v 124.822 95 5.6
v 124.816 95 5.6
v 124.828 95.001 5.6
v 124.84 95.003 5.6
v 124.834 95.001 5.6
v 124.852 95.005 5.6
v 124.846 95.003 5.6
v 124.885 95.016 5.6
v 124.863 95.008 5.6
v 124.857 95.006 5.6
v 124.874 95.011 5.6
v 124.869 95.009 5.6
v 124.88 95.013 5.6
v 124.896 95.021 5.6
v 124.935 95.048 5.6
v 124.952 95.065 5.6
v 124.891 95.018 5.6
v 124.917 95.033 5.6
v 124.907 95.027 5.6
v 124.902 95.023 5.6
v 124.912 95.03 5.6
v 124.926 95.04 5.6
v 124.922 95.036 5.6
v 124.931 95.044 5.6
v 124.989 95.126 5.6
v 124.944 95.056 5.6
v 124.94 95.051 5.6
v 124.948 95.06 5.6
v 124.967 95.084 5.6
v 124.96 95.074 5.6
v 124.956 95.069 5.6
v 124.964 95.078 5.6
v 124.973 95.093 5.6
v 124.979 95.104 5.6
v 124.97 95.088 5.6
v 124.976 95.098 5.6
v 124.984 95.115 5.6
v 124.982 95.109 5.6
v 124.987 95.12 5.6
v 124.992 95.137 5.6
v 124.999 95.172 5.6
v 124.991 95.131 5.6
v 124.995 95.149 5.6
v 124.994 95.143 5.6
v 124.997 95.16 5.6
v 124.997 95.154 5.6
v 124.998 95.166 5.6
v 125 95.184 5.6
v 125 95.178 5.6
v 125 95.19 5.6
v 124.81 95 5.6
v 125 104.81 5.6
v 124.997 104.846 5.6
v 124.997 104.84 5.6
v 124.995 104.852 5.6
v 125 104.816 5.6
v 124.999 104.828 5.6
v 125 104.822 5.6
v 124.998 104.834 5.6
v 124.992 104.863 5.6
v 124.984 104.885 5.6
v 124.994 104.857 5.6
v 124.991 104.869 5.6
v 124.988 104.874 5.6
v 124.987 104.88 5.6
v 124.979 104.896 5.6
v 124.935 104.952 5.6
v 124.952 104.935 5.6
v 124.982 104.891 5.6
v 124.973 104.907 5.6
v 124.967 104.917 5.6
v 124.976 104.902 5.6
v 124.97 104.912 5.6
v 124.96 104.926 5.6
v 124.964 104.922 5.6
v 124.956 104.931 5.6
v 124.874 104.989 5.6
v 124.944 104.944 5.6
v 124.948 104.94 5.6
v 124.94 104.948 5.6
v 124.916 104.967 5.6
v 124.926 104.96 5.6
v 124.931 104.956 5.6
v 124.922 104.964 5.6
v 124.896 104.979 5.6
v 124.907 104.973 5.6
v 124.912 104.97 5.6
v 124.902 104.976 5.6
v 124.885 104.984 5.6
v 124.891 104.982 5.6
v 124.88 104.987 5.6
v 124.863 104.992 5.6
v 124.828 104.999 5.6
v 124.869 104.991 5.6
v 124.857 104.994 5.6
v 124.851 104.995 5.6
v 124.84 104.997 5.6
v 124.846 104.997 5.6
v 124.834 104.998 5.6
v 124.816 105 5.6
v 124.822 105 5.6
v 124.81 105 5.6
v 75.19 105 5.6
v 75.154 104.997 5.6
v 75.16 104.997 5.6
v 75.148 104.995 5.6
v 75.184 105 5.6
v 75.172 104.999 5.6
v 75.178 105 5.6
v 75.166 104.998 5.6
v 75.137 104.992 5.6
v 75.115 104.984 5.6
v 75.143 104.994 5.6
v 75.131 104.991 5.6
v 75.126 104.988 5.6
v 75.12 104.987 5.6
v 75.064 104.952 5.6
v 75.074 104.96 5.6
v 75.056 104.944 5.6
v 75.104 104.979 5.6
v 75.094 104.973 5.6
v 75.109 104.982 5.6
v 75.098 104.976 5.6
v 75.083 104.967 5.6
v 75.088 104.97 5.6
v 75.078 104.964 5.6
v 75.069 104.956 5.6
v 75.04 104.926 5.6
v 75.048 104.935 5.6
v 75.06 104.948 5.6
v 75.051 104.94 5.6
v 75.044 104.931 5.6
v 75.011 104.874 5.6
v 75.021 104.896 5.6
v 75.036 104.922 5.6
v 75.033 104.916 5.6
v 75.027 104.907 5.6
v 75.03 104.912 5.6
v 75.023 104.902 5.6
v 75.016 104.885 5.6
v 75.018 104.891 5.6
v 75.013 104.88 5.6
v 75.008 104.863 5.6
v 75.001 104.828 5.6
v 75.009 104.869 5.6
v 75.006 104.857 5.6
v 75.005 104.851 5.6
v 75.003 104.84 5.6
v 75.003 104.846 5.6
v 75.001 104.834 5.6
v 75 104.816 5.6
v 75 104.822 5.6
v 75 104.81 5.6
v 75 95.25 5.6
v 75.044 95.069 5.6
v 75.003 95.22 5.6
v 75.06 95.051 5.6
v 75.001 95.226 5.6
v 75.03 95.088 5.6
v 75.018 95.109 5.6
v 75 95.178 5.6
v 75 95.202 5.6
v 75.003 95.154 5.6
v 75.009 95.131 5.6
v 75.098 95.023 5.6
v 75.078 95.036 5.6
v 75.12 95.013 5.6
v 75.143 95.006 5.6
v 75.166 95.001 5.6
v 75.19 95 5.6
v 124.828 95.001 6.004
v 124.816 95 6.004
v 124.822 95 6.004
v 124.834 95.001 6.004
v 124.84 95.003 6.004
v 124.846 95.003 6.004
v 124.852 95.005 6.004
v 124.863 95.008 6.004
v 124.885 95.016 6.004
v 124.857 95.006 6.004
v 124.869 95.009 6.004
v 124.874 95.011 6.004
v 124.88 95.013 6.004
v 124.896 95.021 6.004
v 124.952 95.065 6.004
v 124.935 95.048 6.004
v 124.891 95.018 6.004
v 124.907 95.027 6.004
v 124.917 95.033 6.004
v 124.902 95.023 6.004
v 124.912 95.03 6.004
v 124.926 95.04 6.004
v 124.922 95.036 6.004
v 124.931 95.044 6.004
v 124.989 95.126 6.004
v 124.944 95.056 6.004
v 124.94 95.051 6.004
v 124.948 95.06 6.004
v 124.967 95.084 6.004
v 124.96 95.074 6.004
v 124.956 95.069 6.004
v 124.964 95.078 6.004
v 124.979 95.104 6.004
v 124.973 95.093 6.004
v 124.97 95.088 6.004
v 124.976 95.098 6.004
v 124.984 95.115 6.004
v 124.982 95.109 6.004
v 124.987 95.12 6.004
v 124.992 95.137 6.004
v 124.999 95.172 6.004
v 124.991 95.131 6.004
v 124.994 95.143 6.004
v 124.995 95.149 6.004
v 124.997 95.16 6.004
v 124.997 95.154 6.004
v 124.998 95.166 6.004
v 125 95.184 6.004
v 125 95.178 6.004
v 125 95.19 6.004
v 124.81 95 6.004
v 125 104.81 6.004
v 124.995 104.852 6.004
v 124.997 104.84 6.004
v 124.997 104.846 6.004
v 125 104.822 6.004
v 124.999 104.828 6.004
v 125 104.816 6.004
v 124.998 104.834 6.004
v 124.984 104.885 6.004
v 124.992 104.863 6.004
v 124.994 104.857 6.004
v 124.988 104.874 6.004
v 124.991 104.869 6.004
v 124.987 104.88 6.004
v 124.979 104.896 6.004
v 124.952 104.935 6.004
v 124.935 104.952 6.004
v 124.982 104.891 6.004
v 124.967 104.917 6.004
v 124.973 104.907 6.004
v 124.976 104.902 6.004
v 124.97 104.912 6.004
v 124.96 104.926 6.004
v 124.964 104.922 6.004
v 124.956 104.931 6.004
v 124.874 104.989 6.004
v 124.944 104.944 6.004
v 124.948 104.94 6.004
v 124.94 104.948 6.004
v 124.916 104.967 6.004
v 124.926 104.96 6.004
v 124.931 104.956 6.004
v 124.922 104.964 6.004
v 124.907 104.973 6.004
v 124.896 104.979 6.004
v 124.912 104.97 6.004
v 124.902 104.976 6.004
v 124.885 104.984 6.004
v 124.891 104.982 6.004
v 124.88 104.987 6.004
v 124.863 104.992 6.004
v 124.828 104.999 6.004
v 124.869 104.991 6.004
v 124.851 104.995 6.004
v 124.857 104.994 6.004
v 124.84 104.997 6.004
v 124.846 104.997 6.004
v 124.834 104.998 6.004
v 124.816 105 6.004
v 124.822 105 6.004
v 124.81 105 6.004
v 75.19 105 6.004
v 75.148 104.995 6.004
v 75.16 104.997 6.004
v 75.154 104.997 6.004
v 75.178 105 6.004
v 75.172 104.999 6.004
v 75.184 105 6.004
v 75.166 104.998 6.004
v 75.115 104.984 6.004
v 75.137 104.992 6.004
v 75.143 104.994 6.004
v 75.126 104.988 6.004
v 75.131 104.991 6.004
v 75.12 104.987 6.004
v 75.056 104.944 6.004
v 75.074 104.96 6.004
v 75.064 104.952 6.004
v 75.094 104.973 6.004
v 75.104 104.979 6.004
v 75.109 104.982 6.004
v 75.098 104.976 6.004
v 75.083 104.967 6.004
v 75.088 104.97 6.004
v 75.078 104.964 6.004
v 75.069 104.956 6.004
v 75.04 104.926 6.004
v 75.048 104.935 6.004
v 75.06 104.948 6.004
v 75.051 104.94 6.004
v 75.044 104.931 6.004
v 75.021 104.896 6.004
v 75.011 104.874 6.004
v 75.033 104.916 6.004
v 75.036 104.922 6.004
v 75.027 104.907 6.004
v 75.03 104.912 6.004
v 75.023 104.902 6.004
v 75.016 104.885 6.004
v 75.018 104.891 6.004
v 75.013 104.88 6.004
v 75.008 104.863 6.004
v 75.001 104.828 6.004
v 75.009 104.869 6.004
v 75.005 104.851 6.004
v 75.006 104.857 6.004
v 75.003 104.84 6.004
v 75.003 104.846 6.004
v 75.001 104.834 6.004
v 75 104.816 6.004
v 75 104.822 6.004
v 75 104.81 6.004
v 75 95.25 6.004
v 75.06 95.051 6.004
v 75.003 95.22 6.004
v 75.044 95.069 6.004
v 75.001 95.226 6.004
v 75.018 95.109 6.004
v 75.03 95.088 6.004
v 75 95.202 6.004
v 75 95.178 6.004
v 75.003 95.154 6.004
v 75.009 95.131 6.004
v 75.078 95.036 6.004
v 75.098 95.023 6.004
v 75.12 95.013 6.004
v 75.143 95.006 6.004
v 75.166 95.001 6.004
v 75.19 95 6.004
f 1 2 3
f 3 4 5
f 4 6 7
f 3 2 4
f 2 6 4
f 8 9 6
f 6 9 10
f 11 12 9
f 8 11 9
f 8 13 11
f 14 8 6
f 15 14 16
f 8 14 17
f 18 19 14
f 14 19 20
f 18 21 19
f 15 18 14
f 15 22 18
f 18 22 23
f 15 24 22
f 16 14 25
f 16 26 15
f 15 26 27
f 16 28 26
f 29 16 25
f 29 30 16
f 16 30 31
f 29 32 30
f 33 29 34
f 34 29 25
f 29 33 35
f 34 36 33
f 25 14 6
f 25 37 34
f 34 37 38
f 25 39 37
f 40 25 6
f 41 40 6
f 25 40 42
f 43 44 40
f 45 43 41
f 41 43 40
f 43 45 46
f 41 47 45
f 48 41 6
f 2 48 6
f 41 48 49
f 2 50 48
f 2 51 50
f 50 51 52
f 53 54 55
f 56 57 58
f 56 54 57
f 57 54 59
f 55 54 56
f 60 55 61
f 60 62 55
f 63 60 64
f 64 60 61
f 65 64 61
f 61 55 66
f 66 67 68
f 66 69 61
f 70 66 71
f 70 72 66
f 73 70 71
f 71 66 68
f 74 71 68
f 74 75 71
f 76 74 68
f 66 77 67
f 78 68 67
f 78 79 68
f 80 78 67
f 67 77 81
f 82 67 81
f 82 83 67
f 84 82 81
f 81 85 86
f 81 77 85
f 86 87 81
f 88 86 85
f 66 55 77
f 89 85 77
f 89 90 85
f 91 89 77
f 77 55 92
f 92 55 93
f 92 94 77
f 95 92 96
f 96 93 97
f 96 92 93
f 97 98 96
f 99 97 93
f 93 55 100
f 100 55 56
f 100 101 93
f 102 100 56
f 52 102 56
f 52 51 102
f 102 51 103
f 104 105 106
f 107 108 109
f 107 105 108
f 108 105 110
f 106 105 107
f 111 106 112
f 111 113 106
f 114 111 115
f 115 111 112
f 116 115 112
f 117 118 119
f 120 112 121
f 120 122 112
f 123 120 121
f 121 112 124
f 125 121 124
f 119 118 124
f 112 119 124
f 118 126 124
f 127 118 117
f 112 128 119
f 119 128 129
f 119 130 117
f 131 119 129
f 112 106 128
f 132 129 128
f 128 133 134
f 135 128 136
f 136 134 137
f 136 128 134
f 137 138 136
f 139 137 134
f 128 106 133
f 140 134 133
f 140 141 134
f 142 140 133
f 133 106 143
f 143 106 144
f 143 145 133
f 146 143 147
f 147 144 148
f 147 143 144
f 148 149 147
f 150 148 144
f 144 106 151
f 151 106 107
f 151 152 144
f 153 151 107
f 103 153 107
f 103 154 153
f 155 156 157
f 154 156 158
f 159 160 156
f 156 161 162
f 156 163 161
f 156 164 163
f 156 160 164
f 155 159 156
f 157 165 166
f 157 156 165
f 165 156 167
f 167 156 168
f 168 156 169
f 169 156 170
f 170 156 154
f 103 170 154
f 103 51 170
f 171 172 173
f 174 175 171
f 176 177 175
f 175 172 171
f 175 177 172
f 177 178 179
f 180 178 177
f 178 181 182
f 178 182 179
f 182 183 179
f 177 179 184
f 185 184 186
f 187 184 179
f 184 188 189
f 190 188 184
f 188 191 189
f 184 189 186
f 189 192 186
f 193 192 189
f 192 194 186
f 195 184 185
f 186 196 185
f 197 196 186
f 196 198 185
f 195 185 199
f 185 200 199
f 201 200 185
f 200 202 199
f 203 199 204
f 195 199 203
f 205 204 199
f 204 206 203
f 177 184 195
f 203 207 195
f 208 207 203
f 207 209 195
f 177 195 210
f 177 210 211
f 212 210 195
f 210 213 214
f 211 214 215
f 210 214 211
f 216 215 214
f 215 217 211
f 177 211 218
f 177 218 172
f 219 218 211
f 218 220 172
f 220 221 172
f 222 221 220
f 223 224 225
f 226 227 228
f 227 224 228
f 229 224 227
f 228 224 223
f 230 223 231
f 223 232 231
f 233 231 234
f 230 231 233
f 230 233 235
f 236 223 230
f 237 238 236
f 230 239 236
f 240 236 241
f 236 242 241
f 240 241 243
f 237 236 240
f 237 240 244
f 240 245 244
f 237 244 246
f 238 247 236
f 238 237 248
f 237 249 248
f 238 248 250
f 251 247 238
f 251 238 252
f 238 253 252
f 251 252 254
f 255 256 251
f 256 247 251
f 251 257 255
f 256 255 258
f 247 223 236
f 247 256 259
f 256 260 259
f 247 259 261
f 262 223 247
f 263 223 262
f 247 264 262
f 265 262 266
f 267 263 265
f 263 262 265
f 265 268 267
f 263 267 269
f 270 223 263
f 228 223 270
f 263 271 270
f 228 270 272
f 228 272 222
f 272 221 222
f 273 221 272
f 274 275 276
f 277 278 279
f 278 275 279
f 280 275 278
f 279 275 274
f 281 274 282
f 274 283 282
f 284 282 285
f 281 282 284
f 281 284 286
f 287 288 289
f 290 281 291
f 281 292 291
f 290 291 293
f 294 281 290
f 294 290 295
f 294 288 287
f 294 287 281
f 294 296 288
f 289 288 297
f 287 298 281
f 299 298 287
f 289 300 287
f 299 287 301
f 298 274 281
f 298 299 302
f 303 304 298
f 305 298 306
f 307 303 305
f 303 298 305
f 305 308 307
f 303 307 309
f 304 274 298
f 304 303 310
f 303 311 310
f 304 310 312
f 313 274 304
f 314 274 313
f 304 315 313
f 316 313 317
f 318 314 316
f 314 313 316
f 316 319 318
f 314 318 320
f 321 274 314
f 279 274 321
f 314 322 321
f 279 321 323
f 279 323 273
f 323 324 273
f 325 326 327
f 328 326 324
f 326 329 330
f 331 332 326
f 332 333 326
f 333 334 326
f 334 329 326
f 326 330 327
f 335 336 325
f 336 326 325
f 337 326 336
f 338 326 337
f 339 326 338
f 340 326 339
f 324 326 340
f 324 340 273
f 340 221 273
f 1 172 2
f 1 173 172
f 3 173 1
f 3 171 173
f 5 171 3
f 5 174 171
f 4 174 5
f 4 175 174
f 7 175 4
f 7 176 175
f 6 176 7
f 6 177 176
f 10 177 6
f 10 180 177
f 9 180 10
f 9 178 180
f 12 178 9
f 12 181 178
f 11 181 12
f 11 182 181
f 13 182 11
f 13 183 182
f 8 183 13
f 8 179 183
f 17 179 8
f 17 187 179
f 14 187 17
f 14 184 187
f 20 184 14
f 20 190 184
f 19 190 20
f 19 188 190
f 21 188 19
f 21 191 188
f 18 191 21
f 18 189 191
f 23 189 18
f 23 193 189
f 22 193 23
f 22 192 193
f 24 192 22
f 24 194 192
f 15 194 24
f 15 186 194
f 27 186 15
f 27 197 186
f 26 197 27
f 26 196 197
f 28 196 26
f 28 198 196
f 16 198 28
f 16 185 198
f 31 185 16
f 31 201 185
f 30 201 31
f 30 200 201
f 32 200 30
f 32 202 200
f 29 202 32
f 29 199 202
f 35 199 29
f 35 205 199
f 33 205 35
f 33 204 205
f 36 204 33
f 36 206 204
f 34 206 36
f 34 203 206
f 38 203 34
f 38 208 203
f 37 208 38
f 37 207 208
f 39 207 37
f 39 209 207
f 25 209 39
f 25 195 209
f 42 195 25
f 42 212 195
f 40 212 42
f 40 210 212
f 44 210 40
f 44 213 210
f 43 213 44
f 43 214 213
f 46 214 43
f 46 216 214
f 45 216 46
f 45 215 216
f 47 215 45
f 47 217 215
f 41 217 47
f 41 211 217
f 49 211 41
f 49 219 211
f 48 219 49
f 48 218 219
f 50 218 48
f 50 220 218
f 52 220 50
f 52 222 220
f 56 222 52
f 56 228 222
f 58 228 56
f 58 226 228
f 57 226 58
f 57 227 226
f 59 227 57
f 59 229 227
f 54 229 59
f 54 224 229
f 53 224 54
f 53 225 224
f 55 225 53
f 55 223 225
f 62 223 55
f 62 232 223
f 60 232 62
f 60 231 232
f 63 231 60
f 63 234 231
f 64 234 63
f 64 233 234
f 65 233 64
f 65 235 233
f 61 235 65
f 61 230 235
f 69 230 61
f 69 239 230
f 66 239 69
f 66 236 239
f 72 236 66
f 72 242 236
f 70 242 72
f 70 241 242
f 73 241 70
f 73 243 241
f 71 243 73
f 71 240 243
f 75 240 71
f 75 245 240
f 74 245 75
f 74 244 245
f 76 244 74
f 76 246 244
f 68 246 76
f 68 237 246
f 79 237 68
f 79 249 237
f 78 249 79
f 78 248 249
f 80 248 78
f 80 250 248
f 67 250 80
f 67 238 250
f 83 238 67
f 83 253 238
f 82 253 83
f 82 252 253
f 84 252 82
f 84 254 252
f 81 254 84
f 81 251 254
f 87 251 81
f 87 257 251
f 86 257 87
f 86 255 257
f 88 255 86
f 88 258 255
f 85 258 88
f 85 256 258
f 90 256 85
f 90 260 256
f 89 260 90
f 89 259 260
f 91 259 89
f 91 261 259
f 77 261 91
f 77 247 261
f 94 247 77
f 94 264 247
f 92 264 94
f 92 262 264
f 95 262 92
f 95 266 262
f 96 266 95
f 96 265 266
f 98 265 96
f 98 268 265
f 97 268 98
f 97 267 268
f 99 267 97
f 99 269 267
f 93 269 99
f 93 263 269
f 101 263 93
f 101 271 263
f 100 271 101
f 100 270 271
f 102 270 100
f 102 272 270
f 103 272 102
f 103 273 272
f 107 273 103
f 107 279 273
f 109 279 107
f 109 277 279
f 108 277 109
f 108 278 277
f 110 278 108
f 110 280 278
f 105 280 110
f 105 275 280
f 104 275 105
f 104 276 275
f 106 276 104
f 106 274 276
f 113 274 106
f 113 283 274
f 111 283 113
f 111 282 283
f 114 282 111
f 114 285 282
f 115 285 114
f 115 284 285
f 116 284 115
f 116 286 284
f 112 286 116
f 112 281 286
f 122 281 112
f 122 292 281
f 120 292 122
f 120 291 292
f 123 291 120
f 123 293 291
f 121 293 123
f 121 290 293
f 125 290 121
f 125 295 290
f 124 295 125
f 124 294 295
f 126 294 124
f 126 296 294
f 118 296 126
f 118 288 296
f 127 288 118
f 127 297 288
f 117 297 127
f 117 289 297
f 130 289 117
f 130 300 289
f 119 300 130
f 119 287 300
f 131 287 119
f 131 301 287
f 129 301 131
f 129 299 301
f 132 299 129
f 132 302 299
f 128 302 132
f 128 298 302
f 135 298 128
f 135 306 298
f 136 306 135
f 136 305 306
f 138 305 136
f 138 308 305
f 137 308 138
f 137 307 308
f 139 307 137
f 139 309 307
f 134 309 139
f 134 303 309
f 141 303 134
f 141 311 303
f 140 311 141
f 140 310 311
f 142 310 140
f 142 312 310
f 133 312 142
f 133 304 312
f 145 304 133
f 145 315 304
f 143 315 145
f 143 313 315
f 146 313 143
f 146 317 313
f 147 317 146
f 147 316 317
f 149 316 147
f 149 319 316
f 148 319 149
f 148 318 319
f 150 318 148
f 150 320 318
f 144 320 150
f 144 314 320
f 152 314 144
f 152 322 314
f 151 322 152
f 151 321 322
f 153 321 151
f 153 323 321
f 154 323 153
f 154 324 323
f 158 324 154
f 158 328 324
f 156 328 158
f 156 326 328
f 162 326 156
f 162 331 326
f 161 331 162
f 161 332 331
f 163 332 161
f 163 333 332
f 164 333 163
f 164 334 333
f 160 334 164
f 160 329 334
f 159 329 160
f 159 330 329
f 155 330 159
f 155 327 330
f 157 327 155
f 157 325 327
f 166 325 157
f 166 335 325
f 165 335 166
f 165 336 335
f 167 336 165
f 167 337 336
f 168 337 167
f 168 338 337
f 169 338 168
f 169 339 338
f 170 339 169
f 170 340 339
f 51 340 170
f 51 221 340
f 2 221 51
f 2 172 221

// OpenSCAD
module drawBasicShape(x1, y1, x2, y2, width)
{
	length = sqrt((x1-x2)*(x1-x2) + (y1-y2)*(y1-y2));
	if (width!=0.0) {
		square(size = [width, length], center = false);
		translate([width/2.0, 0, 0]) circle(d=width);
		translate([width/2.0, length, 0]) circle(d=width);
	}
}

module translateAndRotate(x1, y1, x2, y2, width)
{
	if (width != 0.0) {
		angle = atan((y2-y1)/(x2-x1)) +270;
		if (x2>=x1) {
			translate([x1, y1, 0.0]) rotate([0.0, 0.0, angle]) translate([-width/2.0, 0.0, 0.0]) scale([1.0, 1.0, 1.0]) drawBasicShape(x1, y1, x2, y2, width);
		}
		else {
			translate([x1, y1, 0.0]) rotate([0.0, 0.0, angle+180]) translate([-width/2.0, 0.0, 0.0]) scale([1.0, 1.0, 1.0]) drawBasicShape(x1, y1, x2, y2, width);		}
	}
}

$fn=50;

points13 = [
[75.77800000, 95.77800000, 0.00000000],
[124.22200000, 95.77800000, 0.37999672],
[124.22200000, 104.22200000, 0.37997788],
[75.77800000, 104.22200000, 0.37999548],
[75.77800000, 95.83800000, 0.37998140],
[75.48400000, 95.48400000, 0.00000000],
[124.51600000, 95.48400000, 0.37999746],
[124.51600000, 104.51600000, 0.37998977],
[75.48400000, 104.51600000, 0.37999868],
[75.48400000, 95.54400000, 0.37998644],
[75.19000000, 95.19000000, 0.00000000],
[124.81000000, 95.19000000, 0.38000060],
[124.81000000, 104.81000000, 0.38000021],
[75.19000000, 104.81000000, 0.37999939],
[75.19000000, 95.25000000, 0.38000344],
[75.53600000, 95.39000000, 0.00000000],
[76.11100000, 95.94600000, 0.00000000],
[75.94600000, 96.11100000, 0.37935605],
[75.94600000, 96.52800000, 0.38015610],
[76.52800000, 95.94600000, 0.37989934],
[76.94500000, 95.94600000, 0.38001190],
[75.94600000, 96.94500000, 0.37994651],
[75.94600000, 97.36200000, 0.38015610],
[77.36200000, 95.94600000, 0.37996589],
[77.77900000, 95.94600000, 0.38015610],
[75.94600000, 97.77900000, 0.37999966],
[75.94600000, 98.19600000, 0.38001190],
[78.19600000, 95.94600000, 0.38000201],
[78.61300000, 95.94600000, 0.38015610],
[75.94600000, 98.61300000, 0.38000362],
[75.94600000, 99.03000000, 0.38001190],
[79.03000000, 95.94600000, 0.38003238],
[79.44700000, 95.94600000, 0.38001190],
[75.94600000, 99.44700000, 0.38001785],
[75.94600000, 99.86400000, 0.38001190],
[79.86400000, 95.94600000, 0.38002811],
[80.28100000, 95.94600000, 0.38001190],
[75.94600000, 100.28100000, 0.38002660],
[75.94600000, 100.69800000, 0.38015610],
[80.69800000, 95.94600000, 0.38002534],
[81.11500000, 95.94600000, 0.38001190],
[75.94600000, 101.11500000, 0.38003252],
[75.94600000, 101.53300000, 0.37930814],
[81.53300000, 95.94600000, 0.37997836],
[81.95000000, 95.94600000, 0.38001190],
[75.94600000, 101.95000000, 0.37998780],
[75.94600000, 102.36700000, 0.38001190],
[82.36700000, 95.94600000, 0.37998939],
[82.78400000, 95.94600000, 0.38001190],
[75.94600000, 102.78400000, 0.37999079],
[75.94600000, 103.20100000, 0.38001190],
[83.20100000, 95.94600000, 0.37999203],
[83.61800000, 95.94600000, 0.38015610],
[75.94600000, 103.61800000, 0.37999314],
[75.95600000, 104.02400000, 0.38048727],
[84.03500000, 95.94600000, 0.38000275],
[84.45200000, 95.94600000, 0.38001190],
[76.34400000, 104.05400000, 0.38000754],
[76.76100000, 104.05400000, 0.38001190],
[84.86900000, 95.94600000, 0.38000229],
[85.28600000, 95.94600000, 0.38001190],
[77.17800000, 104.05400000, 0.38000754],
[77.59500000, 104.05400000, 0.38001190],
[85.70300000, 95.94600000, 0.38000229],
[86.12000000, 95.94600000, 0.38015610],
[78.01200000, 104.05400000, 0.38000229],
[78.42900000, 104.05400000, 0.38001190],
[86.53700000, 95.94600000, 0.38000754],
[86.95400000, 95.94600000, 0.38001190],
[78.84600000, 104.05400000, 0.38000229],
[79.26300000, 104.05400000, 0.38001190],
[87.37100000, 95.94600000, 0.38000754],
[87.78900000, 95.94600000, 0.37930814],
[79.68000000, 104.05400000, 0.37998415],
[80.09700000, 104.05400000, 0.38015610],
[88.20600000, 95.94600000, 0.37998415],
[88.62300000, 95.94600000, 0.38001190],
[80.51500000, 104.05400000, 0.38000754],
[80.93200000, 104.05400000, 0.38001190],
[89.04000000, 95.94600000, 0.38000229],
[89.45700000, 95.94600000, 0.38001190],
[81.34900000, 104.05400000, 0.38000754],
[81.76600000, 104.05400000, 0.38001190],
[89.87400000, 95.94600000, 0.38000229],
[90.29100000, 95.94600000, 0.38015610],
[82.18300000, 104.05400000, 0.38000229],
[82.60000000, 104.05400000, 0.38001190],
[90.70800000, 95.94600000, 0.38000229],
[91.12500000, 95.94600000, 0.38015610],
[83.01700000, 104.05400000, 0.38000229],
[83.43400000, 104.05400000, 0.38001190],
[91.54200000, 95.94600000, 0.38000754],
[91.95900000, 95.94600000, 0.38001190],
[83.85100000, 104.05400000, 0.38000229],
[84.26800000, 104.05400000, 0.38001190],
[92.37600000, 95.94600000, 0.38000754],
[92.79300000, 95.94600000, 0.38001190],
[84.68500000, 104.05400000, 0.38000229],
[85.10200000, 104.05400000, 0.38015610],
[93.21000000, 95.94600000, 0.38000229],
[93.62700000, 95.94600000, 0.38001190],
[85.51900000, 104.05400000, 0.38000754],
[85.93600000, 104.05400000, 0.38001190],
[94.04400000, 95.94600000, 0.38000229],
[94.46200000, 95.94600000, 0.37930814],
[86.35300000, 104.05400000, 0.37998940],
[86.77000000, 104.05400000, 0.38001190],
[94.87900000, 95.94600000, 0.37998415],
[95.29600000, 95.94600000, 0.38015610],
[87.18800000, 104.05400000, 0.38000229],
[87.60500000, 104.05400000, 0.38001190],
[95.71300000, 95.94600000, 0.38000754],
[96.13000000, 95.94600000, 0.38001190],
[88.02200000, 104.05400000, 0.38000229],
[88.43900000, 104.05400000, 0.38001190],
[96.54700000, 95.94600000, 0.38000754],
[96.96400000, 95.94600000, 0.38001190],
[88.85600000, 104.05400000, 0.38000229],
[89.27300000, 104.05400000, 0.38015610],
[97.38100000, 95.94600000, 0.38000229],
[97.79800000, 95.94600000, 0.38001190],
[89.69000000, 104.05400000, 0.38000754],
[90.10700000, 104.05400000, 0.38001190],
[98.21500000, 95.94600000, 0.38000229],
[98.63200000, 95.94600000, 0.38001190],
[90.52400000, 104.05400000, 0.38000754],
[90.94100000, 104.05400000, 0.38001190],
[99.04900000, 95.94600000, 0.38000229],
[99.46600000, 95.94600000, 0.38015610],
[91.35800000, 104.05400000, 0.38000229],
[91.77500000, 104.05400000, 0.38001190],
[99.88300000, 95.94600000, 0.38000754],
[100.30000000, 95.94600000, 0.38001190],
[92.19200000, 104.05400000, 0.38000229],
[92.60900000, 104.05400000, 0.38001190],
[100.71800000, 95.94600000, 0.37998940],
[101.13500000, 95.94600000, 0.38001190],
[93.02600000, 104.05400000, 0.37998415],
[93.44400000, 104.05400000, 0.37945200],
[101.55200000, 95.94600000, 0.38000229],
[101.96900000, 95.94600000, 0.38001190],
[93.86100000, 104.05400000, 0.38000754],
[94.27800000, 104.05400000, 0.38001190],
[102.38600000, 95.94600000, 0.38000229],
[102.80300000, 95.94600000, 0.38001190],
[94.69500000, 104.05400000, 0.38000754],
[95.11200000, 104.05400000, 0.38001190],
[103.22000000, 95.94600000, 0.38000229],
[103.63700000, 95.94600000, 0.38015610],
[95.52900000, 104.05400000, 0.38000229],
[95.94600000, 104.05400000, 0.38001190],
[104.05400000, 95.94600000, 0.38000754],
[104.47100000, 95.94600000, 0.38001190],
[96.36300000, 104.05400000, 0.38000229],
[96.78000000, 104.05400000, 0.38001190],
[104.88800000, 95.94600000, 0.38000754],
[105.30500000, 95.94600000, 0.38001190],
[97.19700000, 104.05400000, 0.38000229],
[97.61400000, 104.05400000, 0.38015610],
[105.72200000, 95.94600000, 0.38000229],
[106.13900000, 95.94600000, 0.38001190],
[98.03100000, 104.05400000, 0.38000754],
[98.44800000, 104.05400000, 0.38001190],
[106.55600000, 95.94600000, 0.38000229],
[106.97300000, 95.94600000, 0.38001190],
[98.86500000, 104.05400000, 0.38000754],
[99.28200000, 104.05400000, 0.38001190],
[107.39100000, 95.94600000, 0.37998415],
[107.80800000, 95.94600000, 0.38015610],
[99.69900000, 104.05400000, 0.37998415],
[100.11700000, 104.05400000, 0.37930814],
[108.22500000, 95.94600000, 0.38000754],
[108.64200000, 95.94600000, 0.38001190],
[100.53400000, 104.05400000, 0.38000229],
[100.95100000, 104.05400000, 0.38001190],
[109.05900000, 95.94600000, 0.38000754],
[109.47600000, 95.94600000, 0.38001190],
[101.36800000, 104.05400000, 0.38000229],
[101.78500000, 104.05400000, 0.38015610],
[109.89300000, 95.94600000, 0.38000229],
[110.31000000, 95.94600000, 0.38001190],
[102.20200000, 104.05400000, 0.38000754],
[102.61900000, 104.05400000, 0.38001190],
[110.72700000, 95.94600000, 0.38000229],
[111.14400000, 95.94600000, 0.38001190],
[103.03600000, 104.05400000, 0.38000754],
[103.45300000, 104.05400000, 0.38001190],
[111.56100000, 95.94600000, 0.38000229],
[111.97800000, 95.94600000, 0.38015610],
[103.87000000, 104.05400000, 0.38000229],
[104.28700000, 104.05400000, 0.38001190],
[112.39500000, 95.94600000, 0.38000754],
[112.81200000, 95.94600000, 0.38001190],
[104.70400000, 104.05400000, 0.38000229],
[105.12100000, 104.05400000, 0.38001190],
[113.22900000, 95.94600000, 0.38000754],
[113.64700000, 95.94600000, 0.37930814],
[105.53800000, 104.05400000, 0.37998415],
[105.95500000, 104.05400000, 0.38015610],
[114.06400000, 95.94600000, 0.37998415],
[114.48100000, 95.94600000, 0.38001190],
[106.37300000, 104.05400000, 0.38000754],
[106.79000000, 104.05400000, 0.38001190],
[114.89800000, 95.94600000, 0.38000229],
[115.31500000, 95.94600000, 0.38001190],
[107.20700000, 104.05400000, 0.38000754],
[107.62400000, 104.05400000, 0.38001190],
[115.73200000, 95.94600000, 0.38000229],
[116.14900000, 95.94600000, 0.38015610],
[108.04100000, 104.05400000, 0.38000229],
[108.45800000, 104.05400000, 0.38001190],
[116.56600000, 95.94600000, 0.38000754],
[116.98300000, 95.94600000, 0.38001190],
[108.87500000, 104.05400000, 0.38000229],
[109.29200000, 104.05400000, 0.38001190],
[117.40000000, 95.94600000, 0.38000754],
[117.81700000, 95.94600000, 0.38001190],
[109.70900000, 104.05400000, 0.38000229],
[110.12600000, 104.05400000, 0.38015610],
[118.23400000, 95.94600000, 0.38000229],
[118.65100000, 95.94600000, 0.38001190],
[110.54300000, 104.05400000, 0.38000754],
[110.96000000, 104.05400000, 0.38001190],
[119.06800000, 95.94600000, 0.38000229],
[119.48500000, 95.94600000, 0.38001190],
[111.37700000, 104.05400000, 0.38000754],
[111.79400000, 104.05400000, 0.38001190],
[119.90200000, 95.94600000, 0.38000229],
[120.32000000, 95.94600000, 0.37945200],
[112.21100000, 104.05400000, 0.37998415],
[112.62900000, 104.05400000, 0.37930814],
[120.73700000, 95.94600000, 0.38000754],
[121.15400000, 95.94600000, 0.38001190],
[113.04600000, 104.05400000, 0.38000229],
[113.46300000, 104.05400000, 0.38001190],
[121.57100000, 95.94600000, 0.38000754],
[121.98800000, 95.94600000, 0.38001190],
[113.88000000, 104.05400000, 0.38000229],
[114.29700000, 104.05400000, 0.38015610],
[122.40500000, 95.94600000, 0.38000229],
[122.82200000, 95.94600000, 0.38001190],
[114.71400000, 104.05400000, 0.38000754],
[115.13100000, 104.05400000, 0.38001190],
[123.23900000, 95.94600000, 0.38000229],
[123.65600000, 95.94600000, 0.38001190],
[115.54800000, 104.05400000, 0.38000754],
[115.96500000, 104.05400000, 0.38001190],
[124.04400000, 95.97500000, 0.37998455],
[124.05400000, 96.38200000, 0.37976376],
[116.38200000, 104.05400000, 0.37999868],
[116.79900000, 104.05400000, 0.38001190],
[124.05400000, 96.79900000, 0.37999789],
[124.05400000, 97.21600000, 0.38001190],
[117.21600000, 104.05400000, 0.37999079],
[117.63300000, 104.05400000, 0.38001190],
[124.05400000, 97.63300000, 0.37998939],
[124.05400000, 98.05000000, 0.38015610],
[118.05000000, 104.05400000, 0.37998072],
[118.46700000, 104.05400000, 0.38015610],
[124.05400000, 98.46700000, 0.37997836],
[124.05400000, 98.88400000, 0.38001190],
[118.88400000, 104.05400000, 0.37997562],
[119.30200000, 104.05400000, 0.37930814],
[124.05400000, 99.30200000, 0.38003429],
[124.05400000, 99.71900000, 0.38001190],
[119.71900000, 104.05400000, 0.38003640],
[120.13600000, 104.05400000, 0.38001190],
[124.05400000, 100.13600000, 0.38002811],
[124.05400000, 100.55300000, 0.38001190],
[120.55300000, 104.05400000, 0.38002999],
[120.97000000, 104.05400000, 0.38001190],
[124.05400000, 100.97000000, 0.38003238],
[124.05400000, 101.38700000, 0.38001190],
[121.38700000, 104.05400000, 0.38001957],
[121.80400000, 104.05400000, 0.38001190],
[124.05400000, 101.80400000, 0.38002091],
[124.05400000, 102.22100000, 0.38001190],
[122.22100000, 104.05400000, 0.38002285],
[122.63800000, 104.05400000, 0.38001190],
[124.05400000, 102.63800000, 0.37999592],
[124.05400000, 103.05500000, 0.38001190],
[123.05500000, 104.05400000, 0.37998907],
[123.47200000, 104.05400000, 0.38001190],
[124.05400000, 103.47200000, 0.37997240],
[124.05400000, 103.88900000, 0.38001190],
[123.88900000, 104.05400000, 0.37961375],
];

translate([0.0, 0.0, 5.60000000]) {
	linear_extrude(height = 0.40400000, center = false, convexity = 10, twist = 0) {
		union() {
			for( i=[0:len(points13)-2] ){ 
				x1 = points13[i][0];
				y1 = points13[i][1];
				x2 = points13[i+1][0];
				y2 = points13[i+1][1];
				width = points13[i+1][2];
				translateAndRotate(x1, y1, x2, y2, width);
			}
		}
	}
}
